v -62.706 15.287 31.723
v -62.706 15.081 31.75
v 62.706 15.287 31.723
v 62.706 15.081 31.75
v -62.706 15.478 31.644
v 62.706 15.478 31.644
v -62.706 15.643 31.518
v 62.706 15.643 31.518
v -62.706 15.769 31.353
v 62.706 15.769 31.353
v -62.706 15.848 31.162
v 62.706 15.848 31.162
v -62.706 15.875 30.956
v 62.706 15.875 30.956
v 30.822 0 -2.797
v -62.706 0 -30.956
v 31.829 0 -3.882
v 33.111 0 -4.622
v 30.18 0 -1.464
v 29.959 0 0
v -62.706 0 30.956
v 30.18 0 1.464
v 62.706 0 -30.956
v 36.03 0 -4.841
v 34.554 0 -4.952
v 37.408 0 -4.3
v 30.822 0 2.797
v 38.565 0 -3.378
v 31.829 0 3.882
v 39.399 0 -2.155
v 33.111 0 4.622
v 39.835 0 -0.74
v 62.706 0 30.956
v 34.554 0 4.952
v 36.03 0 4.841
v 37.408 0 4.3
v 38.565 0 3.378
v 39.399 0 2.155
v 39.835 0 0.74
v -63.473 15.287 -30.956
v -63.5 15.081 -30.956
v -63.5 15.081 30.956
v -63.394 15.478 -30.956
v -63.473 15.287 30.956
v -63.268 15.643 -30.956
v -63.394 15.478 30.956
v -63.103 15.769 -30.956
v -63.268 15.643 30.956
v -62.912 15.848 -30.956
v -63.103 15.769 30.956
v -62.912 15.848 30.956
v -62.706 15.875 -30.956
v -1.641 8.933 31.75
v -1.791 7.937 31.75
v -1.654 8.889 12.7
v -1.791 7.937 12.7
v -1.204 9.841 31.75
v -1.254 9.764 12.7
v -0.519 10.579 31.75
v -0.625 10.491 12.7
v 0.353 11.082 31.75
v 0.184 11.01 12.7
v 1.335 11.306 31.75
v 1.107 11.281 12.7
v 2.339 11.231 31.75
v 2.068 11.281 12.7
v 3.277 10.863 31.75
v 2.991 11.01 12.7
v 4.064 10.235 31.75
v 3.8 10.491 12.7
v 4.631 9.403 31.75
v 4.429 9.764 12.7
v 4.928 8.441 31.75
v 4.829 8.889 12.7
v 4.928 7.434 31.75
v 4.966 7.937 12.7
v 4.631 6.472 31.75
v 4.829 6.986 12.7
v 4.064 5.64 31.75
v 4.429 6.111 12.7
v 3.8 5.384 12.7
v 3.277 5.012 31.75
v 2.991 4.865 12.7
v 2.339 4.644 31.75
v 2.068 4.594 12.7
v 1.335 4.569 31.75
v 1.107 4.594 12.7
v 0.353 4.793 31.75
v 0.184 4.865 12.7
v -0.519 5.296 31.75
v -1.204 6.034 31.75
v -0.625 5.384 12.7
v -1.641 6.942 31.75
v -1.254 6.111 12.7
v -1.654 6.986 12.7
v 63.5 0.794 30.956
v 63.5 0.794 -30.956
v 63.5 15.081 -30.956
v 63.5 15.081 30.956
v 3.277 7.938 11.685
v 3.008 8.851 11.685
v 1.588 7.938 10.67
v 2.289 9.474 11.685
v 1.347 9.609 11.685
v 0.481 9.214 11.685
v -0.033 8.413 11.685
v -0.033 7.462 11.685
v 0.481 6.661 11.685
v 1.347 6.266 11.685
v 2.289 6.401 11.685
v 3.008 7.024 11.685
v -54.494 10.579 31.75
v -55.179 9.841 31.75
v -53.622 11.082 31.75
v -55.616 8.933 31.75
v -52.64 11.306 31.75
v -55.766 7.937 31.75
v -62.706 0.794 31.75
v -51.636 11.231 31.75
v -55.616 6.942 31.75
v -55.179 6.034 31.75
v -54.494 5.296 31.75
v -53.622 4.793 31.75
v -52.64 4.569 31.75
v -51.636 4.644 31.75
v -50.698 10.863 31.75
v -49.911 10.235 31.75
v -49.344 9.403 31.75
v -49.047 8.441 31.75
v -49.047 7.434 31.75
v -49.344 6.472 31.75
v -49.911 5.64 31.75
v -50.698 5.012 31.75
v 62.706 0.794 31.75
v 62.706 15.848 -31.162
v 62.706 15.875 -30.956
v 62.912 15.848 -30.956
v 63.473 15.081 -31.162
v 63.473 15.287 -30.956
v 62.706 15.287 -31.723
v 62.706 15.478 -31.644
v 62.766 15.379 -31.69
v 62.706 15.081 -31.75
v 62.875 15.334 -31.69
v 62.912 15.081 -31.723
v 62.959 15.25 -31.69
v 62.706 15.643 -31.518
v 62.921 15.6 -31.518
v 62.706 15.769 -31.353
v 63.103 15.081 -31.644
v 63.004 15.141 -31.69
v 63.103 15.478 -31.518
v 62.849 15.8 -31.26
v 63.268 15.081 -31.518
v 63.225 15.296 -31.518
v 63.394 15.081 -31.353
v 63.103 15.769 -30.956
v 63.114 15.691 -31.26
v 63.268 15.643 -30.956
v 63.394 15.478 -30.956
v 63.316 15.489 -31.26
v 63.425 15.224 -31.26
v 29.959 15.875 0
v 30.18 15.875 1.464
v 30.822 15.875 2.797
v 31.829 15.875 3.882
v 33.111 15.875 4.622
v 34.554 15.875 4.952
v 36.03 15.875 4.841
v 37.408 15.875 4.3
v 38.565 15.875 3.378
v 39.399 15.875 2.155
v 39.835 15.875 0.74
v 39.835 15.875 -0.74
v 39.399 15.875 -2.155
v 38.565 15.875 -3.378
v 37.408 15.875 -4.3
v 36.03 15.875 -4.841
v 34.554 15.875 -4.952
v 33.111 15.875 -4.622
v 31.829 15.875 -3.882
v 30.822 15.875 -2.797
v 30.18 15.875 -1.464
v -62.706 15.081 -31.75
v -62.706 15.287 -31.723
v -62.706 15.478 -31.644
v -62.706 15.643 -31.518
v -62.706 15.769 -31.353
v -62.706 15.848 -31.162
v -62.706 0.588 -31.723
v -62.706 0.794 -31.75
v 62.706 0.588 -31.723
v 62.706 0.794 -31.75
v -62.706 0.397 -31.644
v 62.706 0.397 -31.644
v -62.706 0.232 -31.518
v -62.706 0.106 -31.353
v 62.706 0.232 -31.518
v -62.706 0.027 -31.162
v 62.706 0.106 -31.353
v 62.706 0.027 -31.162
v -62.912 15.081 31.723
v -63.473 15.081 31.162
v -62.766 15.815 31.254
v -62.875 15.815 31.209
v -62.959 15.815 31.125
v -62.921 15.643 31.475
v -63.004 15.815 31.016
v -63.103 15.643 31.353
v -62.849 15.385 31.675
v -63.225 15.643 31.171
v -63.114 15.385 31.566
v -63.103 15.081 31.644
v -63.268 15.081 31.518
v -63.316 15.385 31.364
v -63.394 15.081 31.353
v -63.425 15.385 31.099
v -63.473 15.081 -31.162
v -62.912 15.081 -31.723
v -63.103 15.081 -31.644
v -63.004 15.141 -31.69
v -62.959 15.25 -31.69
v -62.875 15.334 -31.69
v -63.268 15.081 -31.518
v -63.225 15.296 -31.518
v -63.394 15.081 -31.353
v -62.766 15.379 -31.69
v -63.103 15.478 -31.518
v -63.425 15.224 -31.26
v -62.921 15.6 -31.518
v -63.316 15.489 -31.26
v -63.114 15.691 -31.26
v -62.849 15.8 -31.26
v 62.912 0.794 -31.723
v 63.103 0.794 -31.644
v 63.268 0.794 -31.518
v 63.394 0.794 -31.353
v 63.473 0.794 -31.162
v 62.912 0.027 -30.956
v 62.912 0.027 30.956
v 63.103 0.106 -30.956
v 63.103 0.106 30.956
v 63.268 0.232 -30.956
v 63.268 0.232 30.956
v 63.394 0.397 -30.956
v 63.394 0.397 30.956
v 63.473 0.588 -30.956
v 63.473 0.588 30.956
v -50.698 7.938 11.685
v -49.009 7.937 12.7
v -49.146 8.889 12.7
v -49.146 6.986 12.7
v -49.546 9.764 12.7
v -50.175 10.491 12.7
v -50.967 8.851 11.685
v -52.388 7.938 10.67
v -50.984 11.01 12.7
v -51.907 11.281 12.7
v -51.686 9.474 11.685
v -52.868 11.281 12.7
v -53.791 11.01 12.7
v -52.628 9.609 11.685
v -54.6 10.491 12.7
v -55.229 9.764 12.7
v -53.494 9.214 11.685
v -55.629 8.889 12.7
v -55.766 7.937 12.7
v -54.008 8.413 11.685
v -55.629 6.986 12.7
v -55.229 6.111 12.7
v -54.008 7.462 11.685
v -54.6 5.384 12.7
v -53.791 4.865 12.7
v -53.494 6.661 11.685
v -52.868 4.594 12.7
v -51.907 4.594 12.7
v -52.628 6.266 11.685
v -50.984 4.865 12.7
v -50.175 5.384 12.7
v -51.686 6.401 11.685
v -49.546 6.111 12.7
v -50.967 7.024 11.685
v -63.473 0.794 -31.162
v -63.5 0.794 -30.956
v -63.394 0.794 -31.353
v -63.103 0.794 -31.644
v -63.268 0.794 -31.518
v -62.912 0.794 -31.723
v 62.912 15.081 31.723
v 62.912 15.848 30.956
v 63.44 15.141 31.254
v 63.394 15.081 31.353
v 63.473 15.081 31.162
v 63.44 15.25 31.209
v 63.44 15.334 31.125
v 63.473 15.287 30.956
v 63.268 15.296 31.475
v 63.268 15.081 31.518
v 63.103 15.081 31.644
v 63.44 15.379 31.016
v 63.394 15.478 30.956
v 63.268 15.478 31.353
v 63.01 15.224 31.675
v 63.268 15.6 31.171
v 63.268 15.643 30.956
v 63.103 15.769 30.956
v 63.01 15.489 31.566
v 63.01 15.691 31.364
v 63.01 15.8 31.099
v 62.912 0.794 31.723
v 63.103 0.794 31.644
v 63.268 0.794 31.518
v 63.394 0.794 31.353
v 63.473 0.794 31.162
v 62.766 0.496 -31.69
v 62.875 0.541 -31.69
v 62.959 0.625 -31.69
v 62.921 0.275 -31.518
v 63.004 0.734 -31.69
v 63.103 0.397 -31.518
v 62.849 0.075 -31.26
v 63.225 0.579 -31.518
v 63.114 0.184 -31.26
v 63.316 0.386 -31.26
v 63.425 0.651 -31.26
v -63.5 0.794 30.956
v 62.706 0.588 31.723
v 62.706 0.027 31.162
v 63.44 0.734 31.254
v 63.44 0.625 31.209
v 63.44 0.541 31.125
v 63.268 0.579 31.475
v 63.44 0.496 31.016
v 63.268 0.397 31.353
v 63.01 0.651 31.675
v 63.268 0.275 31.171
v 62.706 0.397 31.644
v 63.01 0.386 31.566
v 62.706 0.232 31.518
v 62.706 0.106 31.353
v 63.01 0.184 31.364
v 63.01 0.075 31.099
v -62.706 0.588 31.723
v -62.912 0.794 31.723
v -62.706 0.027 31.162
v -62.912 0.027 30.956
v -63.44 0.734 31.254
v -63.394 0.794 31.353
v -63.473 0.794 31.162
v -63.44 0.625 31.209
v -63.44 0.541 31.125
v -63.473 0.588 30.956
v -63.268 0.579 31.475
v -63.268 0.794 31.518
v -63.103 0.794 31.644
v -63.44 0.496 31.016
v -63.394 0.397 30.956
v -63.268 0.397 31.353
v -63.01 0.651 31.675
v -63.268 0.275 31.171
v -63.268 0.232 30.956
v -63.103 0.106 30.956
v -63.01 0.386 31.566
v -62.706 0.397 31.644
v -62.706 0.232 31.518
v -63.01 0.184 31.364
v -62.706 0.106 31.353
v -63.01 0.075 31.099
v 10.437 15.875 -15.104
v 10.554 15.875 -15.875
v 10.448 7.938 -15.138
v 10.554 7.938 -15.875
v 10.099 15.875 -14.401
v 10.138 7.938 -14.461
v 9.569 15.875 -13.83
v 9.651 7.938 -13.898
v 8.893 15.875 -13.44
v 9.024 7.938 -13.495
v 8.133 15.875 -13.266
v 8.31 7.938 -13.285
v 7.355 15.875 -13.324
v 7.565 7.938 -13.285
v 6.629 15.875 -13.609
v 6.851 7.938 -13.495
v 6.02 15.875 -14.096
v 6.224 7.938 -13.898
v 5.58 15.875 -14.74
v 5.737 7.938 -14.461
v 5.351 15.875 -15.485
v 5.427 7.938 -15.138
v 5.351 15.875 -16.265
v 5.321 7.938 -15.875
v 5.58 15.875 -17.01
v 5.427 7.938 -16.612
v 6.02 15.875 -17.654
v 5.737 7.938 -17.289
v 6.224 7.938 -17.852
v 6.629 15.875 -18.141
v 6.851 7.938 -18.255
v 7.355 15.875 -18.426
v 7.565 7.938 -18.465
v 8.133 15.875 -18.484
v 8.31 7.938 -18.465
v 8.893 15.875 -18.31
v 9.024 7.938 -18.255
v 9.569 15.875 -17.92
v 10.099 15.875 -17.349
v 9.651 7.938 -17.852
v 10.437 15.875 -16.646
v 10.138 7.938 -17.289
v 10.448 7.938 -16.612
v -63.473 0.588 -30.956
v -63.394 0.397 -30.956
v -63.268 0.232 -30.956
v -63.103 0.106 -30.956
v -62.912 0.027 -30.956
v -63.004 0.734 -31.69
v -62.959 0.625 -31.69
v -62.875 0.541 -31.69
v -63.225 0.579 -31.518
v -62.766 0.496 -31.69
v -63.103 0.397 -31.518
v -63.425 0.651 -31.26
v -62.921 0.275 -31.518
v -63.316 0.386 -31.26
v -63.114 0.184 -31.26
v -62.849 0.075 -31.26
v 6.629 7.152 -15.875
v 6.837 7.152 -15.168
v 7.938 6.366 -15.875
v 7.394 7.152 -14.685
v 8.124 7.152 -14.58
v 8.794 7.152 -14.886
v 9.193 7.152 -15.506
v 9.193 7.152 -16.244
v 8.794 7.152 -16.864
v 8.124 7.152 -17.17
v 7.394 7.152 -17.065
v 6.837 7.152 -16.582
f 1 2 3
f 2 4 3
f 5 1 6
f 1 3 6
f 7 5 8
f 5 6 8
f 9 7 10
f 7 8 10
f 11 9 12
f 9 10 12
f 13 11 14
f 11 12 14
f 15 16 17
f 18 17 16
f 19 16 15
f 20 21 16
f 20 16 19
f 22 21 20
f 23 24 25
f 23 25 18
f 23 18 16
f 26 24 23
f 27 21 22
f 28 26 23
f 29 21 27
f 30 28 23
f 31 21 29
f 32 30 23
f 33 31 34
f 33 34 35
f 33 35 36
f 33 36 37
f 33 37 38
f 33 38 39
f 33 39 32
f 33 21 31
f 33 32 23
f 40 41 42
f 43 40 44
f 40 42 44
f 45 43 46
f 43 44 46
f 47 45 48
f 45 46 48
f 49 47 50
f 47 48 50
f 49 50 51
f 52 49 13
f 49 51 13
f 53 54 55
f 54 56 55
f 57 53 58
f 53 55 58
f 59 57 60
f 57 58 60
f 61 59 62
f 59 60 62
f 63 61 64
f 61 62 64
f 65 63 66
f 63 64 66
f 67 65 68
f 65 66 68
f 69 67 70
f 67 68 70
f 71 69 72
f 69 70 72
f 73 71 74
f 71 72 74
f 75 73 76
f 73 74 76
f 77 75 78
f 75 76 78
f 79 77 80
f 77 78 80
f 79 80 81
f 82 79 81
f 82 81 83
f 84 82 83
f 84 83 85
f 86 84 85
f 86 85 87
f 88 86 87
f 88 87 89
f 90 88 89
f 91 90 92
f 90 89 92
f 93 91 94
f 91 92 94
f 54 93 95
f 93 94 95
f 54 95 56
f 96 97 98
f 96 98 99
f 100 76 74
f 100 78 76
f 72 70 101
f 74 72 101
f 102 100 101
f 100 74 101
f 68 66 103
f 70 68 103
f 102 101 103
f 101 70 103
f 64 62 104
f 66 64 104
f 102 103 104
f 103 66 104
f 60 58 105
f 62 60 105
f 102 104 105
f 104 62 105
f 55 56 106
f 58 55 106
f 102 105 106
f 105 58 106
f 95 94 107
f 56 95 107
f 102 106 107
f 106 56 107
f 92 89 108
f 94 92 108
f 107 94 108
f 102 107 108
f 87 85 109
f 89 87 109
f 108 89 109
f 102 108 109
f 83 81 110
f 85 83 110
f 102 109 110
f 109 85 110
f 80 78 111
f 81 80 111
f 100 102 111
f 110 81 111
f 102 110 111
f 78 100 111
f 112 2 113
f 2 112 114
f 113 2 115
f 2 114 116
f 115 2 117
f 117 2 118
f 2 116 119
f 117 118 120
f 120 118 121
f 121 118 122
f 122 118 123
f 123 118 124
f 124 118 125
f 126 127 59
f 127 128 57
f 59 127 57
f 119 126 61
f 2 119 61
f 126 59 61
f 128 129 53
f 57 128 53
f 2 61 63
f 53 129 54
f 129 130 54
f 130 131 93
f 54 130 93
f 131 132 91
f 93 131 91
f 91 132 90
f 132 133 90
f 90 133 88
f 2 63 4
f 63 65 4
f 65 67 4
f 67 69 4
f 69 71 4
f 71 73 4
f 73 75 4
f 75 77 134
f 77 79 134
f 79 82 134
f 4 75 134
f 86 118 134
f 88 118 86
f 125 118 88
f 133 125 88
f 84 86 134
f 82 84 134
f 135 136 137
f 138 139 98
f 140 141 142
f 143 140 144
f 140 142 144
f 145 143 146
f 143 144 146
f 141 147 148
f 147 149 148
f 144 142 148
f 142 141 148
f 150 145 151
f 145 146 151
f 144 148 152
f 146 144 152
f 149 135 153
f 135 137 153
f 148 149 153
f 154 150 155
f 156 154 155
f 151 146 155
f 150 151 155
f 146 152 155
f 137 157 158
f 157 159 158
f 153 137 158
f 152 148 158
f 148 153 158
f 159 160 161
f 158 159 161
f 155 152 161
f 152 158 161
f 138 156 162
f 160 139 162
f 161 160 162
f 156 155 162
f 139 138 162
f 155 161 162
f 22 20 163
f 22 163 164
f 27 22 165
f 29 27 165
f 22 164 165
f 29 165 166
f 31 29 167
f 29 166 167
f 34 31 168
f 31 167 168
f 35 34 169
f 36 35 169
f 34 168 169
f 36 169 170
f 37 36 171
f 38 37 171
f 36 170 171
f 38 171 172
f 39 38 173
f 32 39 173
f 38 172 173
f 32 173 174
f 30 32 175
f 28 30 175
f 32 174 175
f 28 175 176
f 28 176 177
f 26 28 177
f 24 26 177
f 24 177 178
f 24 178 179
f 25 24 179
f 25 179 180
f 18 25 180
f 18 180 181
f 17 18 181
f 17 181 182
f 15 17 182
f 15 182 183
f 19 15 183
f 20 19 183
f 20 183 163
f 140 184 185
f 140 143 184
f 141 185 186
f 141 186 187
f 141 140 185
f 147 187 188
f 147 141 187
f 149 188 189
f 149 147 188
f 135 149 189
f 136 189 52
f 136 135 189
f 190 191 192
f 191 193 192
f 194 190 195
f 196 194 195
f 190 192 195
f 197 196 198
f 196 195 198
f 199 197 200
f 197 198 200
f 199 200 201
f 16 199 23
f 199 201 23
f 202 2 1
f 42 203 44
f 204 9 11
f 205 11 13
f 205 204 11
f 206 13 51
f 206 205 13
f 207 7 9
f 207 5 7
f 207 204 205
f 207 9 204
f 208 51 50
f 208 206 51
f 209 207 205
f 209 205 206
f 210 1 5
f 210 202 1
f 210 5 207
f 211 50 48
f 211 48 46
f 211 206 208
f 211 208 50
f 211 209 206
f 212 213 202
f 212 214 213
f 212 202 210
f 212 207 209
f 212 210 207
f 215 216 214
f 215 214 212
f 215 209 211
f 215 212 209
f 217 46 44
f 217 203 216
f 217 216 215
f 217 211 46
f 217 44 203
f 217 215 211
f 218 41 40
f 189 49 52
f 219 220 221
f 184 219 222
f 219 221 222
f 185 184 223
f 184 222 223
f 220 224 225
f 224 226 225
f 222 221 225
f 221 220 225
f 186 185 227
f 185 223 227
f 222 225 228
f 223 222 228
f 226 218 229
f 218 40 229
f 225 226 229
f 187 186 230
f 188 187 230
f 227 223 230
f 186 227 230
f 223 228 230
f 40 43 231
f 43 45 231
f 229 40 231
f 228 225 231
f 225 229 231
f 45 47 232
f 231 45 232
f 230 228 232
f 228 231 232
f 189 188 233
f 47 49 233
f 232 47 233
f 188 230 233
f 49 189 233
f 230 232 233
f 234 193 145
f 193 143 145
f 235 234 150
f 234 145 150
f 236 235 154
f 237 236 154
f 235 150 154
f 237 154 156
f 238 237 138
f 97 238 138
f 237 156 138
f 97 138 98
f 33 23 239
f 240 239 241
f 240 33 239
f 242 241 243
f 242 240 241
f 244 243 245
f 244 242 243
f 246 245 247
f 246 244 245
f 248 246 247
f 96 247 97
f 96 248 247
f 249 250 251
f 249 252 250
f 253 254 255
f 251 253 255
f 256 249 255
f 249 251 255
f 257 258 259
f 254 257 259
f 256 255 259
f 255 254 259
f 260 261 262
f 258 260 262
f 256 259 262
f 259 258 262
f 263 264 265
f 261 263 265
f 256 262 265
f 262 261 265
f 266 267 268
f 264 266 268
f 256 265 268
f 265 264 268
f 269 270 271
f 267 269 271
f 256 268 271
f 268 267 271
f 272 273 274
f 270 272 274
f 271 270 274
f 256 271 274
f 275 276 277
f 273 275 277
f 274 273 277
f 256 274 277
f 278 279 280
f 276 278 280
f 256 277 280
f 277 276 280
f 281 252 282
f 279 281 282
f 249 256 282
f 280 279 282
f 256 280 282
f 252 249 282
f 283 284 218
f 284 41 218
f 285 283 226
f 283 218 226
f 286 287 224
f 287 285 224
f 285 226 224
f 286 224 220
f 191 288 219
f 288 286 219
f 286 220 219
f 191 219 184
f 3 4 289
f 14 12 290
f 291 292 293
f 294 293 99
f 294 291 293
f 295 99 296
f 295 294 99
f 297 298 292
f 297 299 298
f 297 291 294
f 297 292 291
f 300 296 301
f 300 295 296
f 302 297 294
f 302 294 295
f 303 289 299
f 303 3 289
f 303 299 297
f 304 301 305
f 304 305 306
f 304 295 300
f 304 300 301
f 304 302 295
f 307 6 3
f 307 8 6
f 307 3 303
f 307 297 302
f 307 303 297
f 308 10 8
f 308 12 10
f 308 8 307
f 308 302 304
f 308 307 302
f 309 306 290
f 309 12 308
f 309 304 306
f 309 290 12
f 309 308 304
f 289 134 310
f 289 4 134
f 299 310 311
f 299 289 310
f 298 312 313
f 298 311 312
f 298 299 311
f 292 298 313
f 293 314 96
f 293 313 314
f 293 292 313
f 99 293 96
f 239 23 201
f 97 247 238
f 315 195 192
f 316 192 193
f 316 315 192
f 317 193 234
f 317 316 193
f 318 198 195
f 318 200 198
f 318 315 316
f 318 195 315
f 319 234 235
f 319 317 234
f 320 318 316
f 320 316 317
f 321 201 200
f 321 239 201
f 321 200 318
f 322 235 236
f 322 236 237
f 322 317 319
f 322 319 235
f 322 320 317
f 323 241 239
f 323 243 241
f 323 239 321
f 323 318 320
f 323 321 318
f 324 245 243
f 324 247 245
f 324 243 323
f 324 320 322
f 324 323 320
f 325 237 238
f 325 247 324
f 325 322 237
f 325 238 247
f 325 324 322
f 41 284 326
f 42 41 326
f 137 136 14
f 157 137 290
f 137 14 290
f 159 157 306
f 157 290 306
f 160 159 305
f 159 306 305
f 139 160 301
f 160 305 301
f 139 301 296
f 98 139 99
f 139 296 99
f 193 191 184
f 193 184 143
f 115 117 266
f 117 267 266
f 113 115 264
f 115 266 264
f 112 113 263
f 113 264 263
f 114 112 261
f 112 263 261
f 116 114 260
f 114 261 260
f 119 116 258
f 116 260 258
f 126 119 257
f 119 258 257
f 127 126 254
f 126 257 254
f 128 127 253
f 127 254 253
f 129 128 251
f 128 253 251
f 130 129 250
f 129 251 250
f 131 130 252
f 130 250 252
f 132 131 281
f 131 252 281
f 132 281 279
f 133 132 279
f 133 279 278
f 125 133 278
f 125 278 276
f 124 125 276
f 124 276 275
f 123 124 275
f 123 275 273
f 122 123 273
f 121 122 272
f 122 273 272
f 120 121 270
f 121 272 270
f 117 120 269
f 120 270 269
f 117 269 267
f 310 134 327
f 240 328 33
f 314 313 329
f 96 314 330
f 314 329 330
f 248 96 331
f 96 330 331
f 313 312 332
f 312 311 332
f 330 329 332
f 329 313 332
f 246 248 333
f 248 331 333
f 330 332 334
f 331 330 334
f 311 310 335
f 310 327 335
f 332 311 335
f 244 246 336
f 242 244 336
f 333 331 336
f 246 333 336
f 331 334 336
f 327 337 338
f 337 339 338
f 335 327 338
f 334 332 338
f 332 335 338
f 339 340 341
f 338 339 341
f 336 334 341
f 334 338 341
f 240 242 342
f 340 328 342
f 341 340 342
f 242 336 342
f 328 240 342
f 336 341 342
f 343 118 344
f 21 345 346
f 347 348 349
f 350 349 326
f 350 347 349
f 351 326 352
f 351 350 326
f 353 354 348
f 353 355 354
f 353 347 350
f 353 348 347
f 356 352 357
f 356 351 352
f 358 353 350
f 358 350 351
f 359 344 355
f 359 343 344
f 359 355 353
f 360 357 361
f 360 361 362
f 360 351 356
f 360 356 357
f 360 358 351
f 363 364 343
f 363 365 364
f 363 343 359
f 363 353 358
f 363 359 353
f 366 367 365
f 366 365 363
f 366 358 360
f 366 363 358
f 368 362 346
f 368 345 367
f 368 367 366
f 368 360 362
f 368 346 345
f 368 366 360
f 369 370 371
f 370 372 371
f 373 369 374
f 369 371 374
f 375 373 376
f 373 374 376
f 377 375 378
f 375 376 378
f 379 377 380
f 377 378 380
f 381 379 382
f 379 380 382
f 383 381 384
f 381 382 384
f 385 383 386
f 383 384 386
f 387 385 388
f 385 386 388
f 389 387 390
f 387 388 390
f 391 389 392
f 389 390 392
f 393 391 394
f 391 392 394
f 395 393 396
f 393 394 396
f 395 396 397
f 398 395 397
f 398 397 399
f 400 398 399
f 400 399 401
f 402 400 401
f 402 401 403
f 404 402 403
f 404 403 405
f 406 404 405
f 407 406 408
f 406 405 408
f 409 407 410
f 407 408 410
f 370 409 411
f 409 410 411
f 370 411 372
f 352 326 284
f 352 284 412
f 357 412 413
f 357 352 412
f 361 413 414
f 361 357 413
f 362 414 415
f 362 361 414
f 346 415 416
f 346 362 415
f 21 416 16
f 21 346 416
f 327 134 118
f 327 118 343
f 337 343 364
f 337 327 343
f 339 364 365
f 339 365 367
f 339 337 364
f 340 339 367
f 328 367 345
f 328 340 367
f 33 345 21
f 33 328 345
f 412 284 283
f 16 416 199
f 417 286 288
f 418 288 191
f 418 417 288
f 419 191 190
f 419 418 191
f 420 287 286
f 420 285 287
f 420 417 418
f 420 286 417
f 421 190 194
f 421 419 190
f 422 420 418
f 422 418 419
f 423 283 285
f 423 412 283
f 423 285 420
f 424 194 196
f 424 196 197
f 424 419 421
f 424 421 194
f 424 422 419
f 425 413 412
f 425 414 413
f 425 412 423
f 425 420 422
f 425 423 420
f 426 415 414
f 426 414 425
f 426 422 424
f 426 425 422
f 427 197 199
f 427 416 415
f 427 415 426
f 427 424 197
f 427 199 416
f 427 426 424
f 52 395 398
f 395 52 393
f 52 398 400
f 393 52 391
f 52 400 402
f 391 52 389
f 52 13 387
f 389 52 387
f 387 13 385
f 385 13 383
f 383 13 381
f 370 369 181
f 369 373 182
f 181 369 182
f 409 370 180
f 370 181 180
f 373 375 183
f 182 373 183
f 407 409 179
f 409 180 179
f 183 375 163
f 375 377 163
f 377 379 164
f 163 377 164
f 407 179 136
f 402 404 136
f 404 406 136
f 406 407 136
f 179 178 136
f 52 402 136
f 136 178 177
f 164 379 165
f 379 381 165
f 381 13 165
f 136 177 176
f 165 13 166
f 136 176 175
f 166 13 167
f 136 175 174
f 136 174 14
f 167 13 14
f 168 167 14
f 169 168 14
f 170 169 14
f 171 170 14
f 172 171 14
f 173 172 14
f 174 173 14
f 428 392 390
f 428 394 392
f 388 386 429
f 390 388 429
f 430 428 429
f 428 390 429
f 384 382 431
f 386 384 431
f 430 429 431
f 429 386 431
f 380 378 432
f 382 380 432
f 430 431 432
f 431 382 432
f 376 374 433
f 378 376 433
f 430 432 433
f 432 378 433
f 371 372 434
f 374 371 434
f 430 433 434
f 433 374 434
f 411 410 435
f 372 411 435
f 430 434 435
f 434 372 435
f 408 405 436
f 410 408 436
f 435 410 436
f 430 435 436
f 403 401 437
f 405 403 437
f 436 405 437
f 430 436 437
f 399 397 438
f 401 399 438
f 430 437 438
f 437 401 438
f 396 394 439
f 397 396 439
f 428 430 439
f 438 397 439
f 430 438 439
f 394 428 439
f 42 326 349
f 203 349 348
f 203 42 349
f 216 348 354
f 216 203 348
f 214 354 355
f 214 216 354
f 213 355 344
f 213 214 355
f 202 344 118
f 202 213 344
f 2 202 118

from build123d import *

# Parameters (mm, degrees)
F0_W     = 127
F0_H     = 63.5
F1_DEPTH = 15.875
F3_D     = 6.7564
F3_DEPTH = 19.05
F3_TIP   = 2.0298273432
F5_D     = 9.9314
F7_D     = 5.2324
F7_DEPTH = 7.9375
F7_TIP   = 1.5719715515
F8_R     = 0.79375


with BuildPart() as f1:
    # F0 (on Front) → F1 (new body)
    with BuildSketch(Plane.XZ):
        Rectangle(F0_W, F0_H)
    extrude(amount=-F1_DEPTH)

    # F3
    with Locations(Plane.XY.offset(31.75)):
        with Locations((-52.3875, 7.9375), (1.5875, 7.9375)):
            Hole(F3_D / 2, depth=F3_DEPTH)
            with Locations((0, 0, -(F3_DEPTH + F3_TIP / 2))):  # 118° drill point
                Cone(0, F3_D / 2, F3_TIP, mode=Mode.SUBTRACT)

    # F5 (through all)
    with Locations(Plane.XZ):
        with Locations((34.925, 0)):
            Hole(F5_D / 2)

    # F7
    with Locations(Plane(origin=(0, 15.875, 0), x_dir=(-1, 0, 0), z_dir=(0, 1, 0))):
        with Locations((-7.9375, -15.875)):
            Hole(F7_D / 2, depth=F7_DEPTH)
            with Locations((0, 0, -(F7_DEPTH + F7_TIP / 2))):  # 118° drill point
                Cone(0, F7_D / 2, F7_TIP, mode=Mode.SUBTRACT)

    # F8
    f8_edges = [f1.edges().sort_by_distance(p)[0] for p in [
        (0, 0, 31.75),
        (-63.5, 7.9375, 31.75),
        (0, 15.875, 31.75),
        (63.5, 7.9375, 31.75),
        (63.5, 0, 0),
        (63.5, 15.875, 0),
        (-63.5, 15.875, 0),
        (-63.5, 0, 0),
        (-63.5, 7.9375, -31.75),
        (0, 15.875, -31.75),
        (0, 0, -31.75),
        (63.5, 7.9375, -31.75),
    ]]
    fillet(f8_edges, radius=F8_R)


solid = f1.part
